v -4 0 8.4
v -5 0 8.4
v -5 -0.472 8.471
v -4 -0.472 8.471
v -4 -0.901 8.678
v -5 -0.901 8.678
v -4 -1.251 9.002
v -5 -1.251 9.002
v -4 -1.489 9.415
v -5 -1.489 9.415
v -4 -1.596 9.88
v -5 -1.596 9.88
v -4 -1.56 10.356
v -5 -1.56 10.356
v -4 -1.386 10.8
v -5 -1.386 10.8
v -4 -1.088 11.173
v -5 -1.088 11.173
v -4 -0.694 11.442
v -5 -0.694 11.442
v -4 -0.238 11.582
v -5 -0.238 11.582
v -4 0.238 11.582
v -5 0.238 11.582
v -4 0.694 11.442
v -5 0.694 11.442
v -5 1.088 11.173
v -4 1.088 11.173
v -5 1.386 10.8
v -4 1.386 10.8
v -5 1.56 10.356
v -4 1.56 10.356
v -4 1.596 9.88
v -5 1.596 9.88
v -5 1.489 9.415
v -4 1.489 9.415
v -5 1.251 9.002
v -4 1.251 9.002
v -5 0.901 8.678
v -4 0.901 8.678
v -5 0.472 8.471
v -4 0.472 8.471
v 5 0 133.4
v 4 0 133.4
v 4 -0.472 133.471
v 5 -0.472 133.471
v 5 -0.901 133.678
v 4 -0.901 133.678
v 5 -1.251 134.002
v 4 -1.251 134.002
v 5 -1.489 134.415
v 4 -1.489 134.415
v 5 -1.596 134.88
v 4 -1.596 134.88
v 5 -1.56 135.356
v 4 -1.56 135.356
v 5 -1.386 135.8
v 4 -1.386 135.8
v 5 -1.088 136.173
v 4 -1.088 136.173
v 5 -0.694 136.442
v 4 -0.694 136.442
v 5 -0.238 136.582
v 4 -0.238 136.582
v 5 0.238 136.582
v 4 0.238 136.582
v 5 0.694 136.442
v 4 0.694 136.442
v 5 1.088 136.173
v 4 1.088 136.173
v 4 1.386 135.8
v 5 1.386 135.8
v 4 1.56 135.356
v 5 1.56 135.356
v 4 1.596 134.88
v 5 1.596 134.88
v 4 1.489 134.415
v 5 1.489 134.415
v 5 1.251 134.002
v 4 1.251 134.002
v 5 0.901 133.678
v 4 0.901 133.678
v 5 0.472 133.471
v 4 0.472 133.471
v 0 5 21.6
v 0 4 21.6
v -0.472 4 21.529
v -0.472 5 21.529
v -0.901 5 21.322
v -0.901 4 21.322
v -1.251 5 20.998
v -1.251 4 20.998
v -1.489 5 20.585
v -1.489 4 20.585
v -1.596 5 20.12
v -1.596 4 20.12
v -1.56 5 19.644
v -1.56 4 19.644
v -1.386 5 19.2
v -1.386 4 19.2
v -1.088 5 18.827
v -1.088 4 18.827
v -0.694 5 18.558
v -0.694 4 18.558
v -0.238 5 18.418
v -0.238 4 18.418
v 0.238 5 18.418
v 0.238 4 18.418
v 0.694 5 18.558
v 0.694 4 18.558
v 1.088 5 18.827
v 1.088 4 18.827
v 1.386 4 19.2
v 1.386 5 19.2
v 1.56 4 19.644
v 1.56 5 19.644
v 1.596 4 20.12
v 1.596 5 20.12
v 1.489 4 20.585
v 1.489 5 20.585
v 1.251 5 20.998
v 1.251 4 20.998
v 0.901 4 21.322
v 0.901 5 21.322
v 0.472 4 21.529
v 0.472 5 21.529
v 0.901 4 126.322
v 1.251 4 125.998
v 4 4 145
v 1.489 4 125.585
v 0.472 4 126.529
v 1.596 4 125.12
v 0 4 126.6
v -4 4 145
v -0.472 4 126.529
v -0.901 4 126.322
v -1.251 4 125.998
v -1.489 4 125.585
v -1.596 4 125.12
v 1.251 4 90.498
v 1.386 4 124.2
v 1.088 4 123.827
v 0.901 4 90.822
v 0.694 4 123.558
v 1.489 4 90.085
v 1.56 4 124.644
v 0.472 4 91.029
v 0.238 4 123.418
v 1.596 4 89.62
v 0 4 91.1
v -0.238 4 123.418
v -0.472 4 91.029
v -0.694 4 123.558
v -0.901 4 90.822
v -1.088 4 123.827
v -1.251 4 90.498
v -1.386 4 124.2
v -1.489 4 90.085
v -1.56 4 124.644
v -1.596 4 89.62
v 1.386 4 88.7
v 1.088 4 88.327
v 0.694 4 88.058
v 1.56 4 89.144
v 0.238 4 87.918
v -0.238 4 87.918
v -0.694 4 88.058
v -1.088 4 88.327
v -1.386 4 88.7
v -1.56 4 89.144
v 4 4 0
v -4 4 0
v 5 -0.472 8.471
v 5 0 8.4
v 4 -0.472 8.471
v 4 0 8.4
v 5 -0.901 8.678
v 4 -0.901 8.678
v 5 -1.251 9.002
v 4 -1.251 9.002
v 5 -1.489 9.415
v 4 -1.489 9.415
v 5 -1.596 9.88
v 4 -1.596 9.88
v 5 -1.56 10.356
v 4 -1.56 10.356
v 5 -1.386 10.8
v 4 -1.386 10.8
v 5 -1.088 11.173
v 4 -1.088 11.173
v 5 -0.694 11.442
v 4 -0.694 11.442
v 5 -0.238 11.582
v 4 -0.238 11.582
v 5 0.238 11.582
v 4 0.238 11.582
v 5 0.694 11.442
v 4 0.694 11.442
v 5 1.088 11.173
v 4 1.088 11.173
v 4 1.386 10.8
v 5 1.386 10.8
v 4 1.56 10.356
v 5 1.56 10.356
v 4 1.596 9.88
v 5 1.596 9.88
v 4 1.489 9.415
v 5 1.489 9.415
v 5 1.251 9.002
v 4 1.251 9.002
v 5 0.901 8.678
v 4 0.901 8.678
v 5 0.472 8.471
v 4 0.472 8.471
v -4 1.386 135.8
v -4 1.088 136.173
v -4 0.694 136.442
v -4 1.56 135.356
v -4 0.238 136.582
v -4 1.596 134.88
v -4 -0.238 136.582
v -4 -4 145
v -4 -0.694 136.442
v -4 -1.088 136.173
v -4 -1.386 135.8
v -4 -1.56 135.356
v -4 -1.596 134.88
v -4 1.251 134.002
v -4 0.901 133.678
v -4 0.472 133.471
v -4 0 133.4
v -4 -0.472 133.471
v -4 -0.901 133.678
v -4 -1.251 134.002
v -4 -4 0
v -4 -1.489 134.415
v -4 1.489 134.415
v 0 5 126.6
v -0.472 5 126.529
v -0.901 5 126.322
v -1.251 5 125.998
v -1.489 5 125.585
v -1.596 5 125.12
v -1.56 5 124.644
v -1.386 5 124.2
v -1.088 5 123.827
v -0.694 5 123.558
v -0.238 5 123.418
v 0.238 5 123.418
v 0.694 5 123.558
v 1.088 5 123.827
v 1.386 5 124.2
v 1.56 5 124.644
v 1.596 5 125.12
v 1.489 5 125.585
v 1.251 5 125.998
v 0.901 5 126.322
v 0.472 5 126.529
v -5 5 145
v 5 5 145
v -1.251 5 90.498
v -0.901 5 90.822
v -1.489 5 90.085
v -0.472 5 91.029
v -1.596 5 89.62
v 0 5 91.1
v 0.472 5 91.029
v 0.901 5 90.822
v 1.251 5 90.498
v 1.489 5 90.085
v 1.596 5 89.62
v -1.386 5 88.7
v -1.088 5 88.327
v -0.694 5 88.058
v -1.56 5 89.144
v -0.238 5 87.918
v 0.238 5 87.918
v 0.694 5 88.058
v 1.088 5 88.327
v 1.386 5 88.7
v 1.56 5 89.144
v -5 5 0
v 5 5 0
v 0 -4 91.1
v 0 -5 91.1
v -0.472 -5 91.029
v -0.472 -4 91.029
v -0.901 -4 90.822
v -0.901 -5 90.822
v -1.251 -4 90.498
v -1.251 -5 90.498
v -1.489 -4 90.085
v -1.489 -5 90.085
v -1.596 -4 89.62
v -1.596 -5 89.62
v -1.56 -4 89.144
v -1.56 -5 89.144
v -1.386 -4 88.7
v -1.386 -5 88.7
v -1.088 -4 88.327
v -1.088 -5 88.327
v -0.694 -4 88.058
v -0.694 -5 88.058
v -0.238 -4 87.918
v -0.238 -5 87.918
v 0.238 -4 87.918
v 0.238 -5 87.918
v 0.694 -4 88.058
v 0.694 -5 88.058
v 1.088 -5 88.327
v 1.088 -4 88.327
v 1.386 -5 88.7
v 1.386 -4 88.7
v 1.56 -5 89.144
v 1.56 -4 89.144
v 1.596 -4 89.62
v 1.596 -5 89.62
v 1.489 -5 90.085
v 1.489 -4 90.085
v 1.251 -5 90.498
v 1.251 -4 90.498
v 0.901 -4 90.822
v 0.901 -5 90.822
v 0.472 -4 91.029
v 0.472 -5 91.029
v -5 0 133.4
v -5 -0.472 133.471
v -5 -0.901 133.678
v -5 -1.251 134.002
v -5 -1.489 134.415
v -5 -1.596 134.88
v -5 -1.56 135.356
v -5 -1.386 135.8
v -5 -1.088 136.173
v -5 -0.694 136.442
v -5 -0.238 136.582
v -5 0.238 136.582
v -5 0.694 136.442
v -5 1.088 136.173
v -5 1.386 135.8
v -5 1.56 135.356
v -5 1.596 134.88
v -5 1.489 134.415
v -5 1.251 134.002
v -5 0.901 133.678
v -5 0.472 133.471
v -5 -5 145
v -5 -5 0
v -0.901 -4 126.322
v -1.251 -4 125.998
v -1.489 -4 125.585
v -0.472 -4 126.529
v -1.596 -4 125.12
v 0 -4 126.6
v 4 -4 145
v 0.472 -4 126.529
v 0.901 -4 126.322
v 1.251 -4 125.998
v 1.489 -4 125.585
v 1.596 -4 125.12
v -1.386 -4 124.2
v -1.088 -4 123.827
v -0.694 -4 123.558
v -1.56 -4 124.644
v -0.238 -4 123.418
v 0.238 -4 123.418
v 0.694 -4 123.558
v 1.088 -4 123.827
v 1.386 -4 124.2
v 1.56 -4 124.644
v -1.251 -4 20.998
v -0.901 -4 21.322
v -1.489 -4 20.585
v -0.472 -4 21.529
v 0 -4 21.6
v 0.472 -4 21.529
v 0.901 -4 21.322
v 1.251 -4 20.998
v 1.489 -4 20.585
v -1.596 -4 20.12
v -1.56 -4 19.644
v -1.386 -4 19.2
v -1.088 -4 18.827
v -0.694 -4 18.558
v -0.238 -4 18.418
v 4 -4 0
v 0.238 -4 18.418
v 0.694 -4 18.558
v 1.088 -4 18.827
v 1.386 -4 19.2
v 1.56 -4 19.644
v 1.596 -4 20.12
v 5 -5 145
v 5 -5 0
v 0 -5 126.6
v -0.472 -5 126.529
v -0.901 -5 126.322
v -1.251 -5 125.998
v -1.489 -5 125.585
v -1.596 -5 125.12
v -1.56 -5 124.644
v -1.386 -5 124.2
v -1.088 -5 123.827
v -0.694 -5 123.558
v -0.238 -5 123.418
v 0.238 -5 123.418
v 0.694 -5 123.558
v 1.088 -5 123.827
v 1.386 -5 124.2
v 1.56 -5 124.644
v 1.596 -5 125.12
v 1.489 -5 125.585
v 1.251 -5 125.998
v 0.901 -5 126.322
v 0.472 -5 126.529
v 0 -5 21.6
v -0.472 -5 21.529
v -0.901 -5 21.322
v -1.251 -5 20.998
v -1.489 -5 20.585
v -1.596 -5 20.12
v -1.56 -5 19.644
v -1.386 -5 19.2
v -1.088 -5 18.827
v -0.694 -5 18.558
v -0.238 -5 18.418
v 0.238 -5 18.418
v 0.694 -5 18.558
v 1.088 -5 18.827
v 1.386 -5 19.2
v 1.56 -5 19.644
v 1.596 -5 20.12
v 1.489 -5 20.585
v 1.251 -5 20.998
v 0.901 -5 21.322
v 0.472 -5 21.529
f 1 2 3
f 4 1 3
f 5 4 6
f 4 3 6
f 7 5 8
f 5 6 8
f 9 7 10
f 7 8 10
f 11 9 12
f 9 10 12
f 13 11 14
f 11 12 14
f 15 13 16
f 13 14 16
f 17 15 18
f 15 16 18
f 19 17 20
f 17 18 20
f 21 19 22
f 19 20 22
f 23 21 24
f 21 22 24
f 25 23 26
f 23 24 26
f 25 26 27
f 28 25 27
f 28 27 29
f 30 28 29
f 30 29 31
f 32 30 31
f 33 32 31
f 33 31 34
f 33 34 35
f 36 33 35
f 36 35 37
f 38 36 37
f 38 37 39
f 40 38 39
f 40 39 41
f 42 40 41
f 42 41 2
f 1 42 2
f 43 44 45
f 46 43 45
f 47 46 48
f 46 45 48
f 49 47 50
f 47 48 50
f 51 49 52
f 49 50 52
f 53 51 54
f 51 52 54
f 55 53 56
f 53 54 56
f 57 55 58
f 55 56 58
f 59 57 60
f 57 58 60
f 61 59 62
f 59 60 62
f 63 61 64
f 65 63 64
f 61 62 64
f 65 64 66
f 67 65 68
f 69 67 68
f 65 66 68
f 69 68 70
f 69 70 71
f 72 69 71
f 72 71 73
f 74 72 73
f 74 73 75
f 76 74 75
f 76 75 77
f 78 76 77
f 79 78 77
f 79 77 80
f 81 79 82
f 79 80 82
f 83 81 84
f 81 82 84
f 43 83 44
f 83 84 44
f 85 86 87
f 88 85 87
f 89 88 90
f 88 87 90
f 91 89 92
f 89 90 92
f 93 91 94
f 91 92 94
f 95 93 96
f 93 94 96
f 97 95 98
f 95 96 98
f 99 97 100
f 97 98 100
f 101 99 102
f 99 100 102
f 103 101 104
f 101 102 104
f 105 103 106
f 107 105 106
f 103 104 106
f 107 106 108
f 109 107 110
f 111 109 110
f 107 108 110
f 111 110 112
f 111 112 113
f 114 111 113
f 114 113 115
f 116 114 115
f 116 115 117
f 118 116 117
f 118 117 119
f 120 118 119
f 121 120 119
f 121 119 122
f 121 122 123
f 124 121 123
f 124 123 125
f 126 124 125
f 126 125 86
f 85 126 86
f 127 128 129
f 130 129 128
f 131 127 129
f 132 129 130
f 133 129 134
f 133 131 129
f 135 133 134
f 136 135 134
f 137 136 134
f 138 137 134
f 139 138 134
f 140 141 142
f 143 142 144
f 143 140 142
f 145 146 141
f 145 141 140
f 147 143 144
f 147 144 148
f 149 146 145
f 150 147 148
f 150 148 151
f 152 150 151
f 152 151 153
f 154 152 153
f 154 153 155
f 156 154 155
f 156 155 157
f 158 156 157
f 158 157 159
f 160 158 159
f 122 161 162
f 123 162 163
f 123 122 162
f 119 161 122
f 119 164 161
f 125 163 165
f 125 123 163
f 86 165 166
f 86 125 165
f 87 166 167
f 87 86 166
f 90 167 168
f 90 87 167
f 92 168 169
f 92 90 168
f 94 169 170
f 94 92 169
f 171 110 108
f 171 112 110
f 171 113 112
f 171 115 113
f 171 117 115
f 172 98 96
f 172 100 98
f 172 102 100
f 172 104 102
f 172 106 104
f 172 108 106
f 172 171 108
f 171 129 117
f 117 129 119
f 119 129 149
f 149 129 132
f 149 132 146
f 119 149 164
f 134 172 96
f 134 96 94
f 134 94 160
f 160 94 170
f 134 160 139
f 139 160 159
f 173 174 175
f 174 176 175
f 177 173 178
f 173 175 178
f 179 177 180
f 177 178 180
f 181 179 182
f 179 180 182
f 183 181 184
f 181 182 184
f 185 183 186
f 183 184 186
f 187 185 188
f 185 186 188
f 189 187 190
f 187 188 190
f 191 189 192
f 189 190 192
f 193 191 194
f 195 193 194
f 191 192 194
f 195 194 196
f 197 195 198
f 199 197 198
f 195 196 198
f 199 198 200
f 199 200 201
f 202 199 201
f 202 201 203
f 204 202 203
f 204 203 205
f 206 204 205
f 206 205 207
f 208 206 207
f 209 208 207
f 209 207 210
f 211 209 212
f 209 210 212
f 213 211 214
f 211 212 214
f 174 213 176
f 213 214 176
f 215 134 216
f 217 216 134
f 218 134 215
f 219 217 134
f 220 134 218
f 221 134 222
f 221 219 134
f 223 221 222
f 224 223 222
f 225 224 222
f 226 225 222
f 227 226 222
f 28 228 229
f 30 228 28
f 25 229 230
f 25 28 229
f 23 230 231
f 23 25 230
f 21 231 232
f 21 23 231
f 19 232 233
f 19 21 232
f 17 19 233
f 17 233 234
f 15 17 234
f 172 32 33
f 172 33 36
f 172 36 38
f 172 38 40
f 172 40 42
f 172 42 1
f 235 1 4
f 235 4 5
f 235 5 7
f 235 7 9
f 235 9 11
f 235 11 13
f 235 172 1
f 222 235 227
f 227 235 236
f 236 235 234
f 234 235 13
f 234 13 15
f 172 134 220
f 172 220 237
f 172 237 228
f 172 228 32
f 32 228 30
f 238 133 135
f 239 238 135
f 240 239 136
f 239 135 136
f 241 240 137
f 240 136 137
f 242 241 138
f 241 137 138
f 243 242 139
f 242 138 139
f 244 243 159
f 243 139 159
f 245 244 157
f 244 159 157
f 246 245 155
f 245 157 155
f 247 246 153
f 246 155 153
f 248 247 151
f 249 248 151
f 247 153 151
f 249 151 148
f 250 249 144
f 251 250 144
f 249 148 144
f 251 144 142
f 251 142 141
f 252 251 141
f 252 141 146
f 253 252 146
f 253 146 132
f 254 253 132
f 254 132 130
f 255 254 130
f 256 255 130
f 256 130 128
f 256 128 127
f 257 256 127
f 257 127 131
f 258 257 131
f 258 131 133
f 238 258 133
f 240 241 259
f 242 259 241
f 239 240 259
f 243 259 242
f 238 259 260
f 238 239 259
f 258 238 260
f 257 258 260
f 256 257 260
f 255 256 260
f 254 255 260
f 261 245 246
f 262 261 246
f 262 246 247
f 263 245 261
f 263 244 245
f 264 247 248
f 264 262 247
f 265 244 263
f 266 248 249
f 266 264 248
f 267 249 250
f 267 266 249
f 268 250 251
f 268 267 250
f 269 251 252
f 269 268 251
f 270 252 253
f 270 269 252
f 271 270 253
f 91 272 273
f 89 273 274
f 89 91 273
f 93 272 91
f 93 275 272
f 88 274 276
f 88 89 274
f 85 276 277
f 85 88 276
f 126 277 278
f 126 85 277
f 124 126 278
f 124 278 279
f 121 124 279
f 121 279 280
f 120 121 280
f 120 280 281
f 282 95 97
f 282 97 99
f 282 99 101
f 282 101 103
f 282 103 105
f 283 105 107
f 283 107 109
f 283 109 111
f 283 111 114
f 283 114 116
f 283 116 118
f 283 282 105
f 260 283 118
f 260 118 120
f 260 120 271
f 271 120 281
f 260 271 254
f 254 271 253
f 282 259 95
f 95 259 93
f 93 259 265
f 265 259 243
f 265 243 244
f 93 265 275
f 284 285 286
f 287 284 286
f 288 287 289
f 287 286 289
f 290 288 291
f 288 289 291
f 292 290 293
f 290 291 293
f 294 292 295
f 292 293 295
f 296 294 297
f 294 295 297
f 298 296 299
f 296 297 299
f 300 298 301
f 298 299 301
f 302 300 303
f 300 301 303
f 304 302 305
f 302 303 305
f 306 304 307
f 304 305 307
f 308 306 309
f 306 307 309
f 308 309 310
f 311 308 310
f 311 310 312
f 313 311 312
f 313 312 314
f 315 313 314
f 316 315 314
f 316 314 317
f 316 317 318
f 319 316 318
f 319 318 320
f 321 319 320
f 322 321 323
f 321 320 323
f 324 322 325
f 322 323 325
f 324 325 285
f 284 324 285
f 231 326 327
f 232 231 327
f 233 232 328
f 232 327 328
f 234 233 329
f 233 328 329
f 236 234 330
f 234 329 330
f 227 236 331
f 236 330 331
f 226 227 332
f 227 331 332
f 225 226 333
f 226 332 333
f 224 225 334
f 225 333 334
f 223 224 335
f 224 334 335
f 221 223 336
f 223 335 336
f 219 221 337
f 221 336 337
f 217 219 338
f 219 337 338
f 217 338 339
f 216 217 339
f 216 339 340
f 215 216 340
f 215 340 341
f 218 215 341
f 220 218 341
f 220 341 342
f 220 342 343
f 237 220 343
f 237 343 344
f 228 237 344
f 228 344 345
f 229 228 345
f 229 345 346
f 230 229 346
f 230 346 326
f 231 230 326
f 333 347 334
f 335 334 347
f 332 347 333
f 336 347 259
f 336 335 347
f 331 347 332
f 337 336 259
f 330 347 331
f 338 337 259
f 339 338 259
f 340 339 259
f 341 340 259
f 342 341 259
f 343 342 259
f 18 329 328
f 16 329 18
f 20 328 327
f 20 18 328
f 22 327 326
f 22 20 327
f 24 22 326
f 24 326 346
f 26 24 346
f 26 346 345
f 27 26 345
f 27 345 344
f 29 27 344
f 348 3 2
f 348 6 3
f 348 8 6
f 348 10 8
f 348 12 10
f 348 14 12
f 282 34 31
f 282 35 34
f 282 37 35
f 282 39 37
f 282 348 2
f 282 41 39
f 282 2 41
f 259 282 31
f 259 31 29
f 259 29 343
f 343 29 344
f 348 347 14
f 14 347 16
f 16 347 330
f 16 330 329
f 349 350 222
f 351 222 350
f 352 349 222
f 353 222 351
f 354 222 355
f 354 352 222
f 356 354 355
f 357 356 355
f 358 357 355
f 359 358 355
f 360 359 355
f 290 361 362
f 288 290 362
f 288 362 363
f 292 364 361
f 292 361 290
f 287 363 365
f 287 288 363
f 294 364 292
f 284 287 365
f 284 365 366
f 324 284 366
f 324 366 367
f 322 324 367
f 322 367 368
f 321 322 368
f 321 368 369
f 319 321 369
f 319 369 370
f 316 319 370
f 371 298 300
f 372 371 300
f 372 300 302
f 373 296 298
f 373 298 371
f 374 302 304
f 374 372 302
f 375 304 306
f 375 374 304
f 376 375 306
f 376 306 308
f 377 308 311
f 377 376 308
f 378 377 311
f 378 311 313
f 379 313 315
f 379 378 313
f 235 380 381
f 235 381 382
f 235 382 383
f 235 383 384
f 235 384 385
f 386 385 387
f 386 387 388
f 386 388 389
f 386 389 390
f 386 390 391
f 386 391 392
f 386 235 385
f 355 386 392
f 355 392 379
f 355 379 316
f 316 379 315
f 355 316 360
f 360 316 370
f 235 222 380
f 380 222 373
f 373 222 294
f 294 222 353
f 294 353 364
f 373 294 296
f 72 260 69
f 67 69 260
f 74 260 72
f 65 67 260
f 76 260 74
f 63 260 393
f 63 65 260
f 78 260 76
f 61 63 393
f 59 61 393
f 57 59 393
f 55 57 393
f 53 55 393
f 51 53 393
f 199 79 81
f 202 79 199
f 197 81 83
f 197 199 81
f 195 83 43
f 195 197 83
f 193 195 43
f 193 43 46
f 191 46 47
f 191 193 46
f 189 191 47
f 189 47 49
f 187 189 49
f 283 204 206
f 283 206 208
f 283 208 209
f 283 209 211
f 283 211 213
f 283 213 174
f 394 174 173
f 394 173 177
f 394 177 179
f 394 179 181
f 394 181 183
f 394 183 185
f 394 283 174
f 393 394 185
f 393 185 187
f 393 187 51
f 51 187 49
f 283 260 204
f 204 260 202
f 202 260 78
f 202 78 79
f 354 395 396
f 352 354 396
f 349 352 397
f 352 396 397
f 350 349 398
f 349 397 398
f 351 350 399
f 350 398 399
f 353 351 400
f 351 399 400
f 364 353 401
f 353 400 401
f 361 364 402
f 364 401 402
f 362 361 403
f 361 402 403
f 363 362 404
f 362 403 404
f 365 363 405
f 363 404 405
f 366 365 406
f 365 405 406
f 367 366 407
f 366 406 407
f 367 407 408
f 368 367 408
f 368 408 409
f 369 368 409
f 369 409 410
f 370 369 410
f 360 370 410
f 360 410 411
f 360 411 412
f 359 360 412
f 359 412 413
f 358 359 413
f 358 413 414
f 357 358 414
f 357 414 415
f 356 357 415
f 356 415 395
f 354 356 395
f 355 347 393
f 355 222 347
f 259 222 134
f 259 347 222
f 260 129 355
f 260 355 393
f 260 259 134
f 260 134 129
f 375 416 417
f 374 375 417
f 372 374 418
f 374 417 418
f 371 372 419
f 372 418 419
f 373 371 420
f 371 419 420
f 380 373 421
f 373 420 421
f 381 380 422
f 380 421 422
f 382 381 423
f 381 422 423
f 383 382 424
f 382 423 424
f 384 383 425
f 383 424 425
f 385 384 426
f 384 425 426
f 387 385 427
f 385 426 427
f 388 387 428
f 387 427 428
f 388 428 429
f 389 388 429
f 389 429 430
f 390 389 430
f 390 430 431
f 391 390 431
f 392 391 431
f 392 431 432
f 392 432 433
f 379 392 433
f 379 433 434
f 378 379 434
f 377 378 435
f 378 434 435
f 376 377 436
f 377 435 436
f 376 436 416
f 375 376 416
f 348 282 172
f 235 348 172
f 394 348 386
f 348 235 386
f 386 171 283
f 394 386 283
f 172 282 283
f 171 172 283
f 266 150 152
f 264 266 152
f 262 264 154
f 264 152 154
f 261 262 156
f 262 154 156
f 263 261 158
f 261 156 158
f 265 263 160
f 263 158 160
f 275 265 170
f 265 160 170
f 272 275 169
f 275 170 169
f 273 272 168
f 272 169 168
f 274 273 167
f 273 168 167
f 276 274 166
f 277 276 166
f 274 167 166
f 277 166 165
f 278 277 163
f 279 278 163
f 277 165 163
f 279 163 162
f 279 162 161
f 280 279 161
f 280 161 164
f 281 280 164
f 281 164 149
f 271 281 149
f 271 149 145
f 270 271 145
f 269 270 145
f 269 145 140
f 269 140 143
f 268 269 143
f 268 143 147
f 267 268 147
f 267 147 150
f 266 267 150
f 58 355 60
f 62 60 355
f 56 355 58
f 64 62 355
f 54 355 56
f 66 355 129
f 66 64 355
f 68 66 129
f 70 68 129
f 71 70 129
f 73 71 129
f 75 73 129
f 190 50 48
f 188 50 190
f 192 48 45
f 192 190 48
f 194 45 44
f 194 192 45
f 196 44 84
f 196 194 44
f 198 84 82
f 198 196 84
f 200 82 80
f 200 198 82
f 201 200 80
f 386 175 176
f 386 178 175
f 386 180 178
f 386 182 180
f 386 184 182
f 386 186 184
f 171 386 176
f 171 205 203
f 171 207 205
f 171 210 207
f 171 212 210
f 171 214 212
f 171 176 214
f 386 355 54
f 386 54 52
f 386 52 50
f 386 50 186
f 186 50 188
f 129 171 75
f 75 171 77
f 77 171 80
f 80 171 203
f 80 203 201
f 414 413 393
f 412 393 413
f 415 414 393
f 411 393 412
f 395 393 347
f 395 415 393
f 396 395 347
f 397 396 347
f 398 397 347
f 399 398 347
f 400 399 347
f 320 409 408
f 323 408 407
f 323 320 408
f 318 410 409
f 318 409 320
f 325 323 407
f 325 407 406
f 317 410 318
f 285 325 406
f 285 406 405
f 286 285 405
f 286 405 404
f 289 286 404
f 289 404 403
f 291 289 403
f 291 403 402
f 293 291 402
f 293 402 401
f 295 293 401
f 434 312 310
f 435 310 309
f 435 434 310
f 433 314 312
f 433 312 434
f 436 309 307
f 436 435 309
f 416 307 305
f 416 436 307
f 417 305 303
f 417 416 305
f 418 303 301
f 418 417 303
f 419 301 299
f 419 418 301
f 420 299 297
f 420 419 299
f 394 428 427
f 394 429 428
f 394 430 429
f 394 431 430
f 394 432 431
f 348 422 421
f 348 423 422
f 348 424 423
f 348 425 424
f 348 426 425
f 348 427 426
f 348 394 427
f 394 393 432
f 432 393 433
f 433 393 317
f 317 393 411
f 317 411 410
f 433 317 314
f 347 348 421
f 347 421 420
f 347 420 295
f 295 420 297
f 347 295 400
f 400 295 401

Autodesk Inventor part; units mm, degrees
ref_plane "YZ Plane" through (0, 0, 0) normal (1, 0, 0) x (0, 1, 0)
ref_plane "XZ Plane" through (0, 0, 0) normal (0, 1, 0) x (-1, 0, 0)
ref_plane "XY Plane" through (0, 0, 0) normal (0, 0, 1) x (1, 0, 0)
sketch "スケッチ1" plane through (0, 0, 0) normal (0, 0, 1) x (1, 0, 0)
  line L0 (5, -5) -> (-5, -5)
  line L1 (-5, -5) -> (-5, 5)
  line L2 (-5, 5) -> (5, 5)
  line L3 (5, 5) -> (5, -5)
  line L4 (5, -5) -> (-5, 5) construction
  line L5 (-5, -5) -> (5, 5) construction
  line L6 (4, 4) -> (-4, 4)
  line L7 (-4, 4) -> (-4, -4)
  line L8 (-4, -4) -> (4, -4)
  line L9 (4, -4) -> (4, 4)
  point P0 (0, 0)
  dimension "d0" = 10
  dimension "d1" = 10
  dimension "d2" = 1
extrude "押し出し1" add sketch "スケッチ1" along normal blind 145
sketch "スケッチ2" plane through (5, -5, 0) normal (1, 0, 0) x (0, 0, -1)
  line L0 (0, 5) -> (-145, 5)
  line L1 (0, 1) -> (-145, 1) projected
  line L2 (0, 0) -> (0, 10) projected
  point P0 (-135, 5)
  point P1 (-10, 5)
  dimension "d5" = 10
  dimension "d6" = 125
hole "穴1" at (5, 0, 135) at (5, 0, 10) direction (-1, 0, 0) diameter 3.2 end through all
sketch "スケッチ3" plane through (-5, 5, 0) normal (0, 1, 0) x (1, 0, 0)
  line L0 (5, 0) -> (5, -145)
  line L1 (10, -145) -> (0, -145) projected
  line L2 (10, 0) -> (0, 0) projected
  point P0 (5, -125)
  point P1 (5, -20)
  point P2 (5, -89.5)
  point P3 (5, -72.5)
  dimension "d14" = 20
  dimension "d15" = 105
  dimension "d24" = 17
  dimension "d25" = 89.5
hole "穴2" at (0, 5, 125) at (0, 5, 20) at (0, 5, 89.5) direction (0, -1, 0) diameter 3.2 end through all
properties part number "kaku_1010_plate"
